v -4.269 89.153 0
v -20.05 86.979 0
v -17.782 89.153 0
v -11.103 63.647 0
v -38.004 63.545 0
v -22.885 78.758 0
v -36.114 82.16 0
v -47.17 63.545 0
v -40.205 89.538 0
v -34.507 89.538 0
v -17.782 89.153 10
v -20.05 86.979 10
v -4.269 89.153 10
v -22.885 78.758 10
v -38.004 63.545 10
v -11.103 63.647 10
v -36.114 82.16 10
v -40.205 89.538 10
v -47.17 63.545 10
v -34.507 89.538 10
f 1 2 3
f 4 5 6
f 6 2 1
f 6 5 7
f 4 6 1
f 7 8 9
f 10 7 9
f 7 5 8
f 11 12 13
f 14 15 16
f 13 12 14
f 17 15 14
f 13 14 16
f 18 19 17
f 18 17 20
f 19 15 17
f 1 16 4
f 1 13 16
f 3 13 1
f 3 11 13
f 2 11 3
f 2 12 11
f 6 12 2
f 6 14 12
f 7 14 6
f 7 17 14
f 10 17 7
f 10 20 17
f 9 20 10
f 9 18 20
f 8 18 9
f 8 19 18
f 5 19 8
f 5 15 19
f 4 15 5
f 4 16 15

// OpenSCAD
height_jg = 10.000000000;

center_jg_1 = [-25.719496500,76.541285000];
size_jg_1 = [42.900293000,25.993280000];
stroke_width_jg_1 = 0.100000000;
// paths for jg_1
points_jg_1_1 = [ [-12.284223500,-12.996640000],[-21.450146500,-12.996640000],[-14.485268500,12.996640000],[-8.787945500,12.996640000],[-10.394344500,5.618686000],[2.834822500,2.216901000],[5.669644500,10.437884000],[7.937502500,12.611245000],[21.450146500,12.611245000],[14.616048500,-12.893966000],[-12.284223500,-12.996640000] ];

module polygon_jg_1() {
 render(convexity=4) {
    polygon(points=points_jg_1_1);
 }
}

linear_extrude(height=height_jg) translate(center_jg_1) polygon_jg_1();
